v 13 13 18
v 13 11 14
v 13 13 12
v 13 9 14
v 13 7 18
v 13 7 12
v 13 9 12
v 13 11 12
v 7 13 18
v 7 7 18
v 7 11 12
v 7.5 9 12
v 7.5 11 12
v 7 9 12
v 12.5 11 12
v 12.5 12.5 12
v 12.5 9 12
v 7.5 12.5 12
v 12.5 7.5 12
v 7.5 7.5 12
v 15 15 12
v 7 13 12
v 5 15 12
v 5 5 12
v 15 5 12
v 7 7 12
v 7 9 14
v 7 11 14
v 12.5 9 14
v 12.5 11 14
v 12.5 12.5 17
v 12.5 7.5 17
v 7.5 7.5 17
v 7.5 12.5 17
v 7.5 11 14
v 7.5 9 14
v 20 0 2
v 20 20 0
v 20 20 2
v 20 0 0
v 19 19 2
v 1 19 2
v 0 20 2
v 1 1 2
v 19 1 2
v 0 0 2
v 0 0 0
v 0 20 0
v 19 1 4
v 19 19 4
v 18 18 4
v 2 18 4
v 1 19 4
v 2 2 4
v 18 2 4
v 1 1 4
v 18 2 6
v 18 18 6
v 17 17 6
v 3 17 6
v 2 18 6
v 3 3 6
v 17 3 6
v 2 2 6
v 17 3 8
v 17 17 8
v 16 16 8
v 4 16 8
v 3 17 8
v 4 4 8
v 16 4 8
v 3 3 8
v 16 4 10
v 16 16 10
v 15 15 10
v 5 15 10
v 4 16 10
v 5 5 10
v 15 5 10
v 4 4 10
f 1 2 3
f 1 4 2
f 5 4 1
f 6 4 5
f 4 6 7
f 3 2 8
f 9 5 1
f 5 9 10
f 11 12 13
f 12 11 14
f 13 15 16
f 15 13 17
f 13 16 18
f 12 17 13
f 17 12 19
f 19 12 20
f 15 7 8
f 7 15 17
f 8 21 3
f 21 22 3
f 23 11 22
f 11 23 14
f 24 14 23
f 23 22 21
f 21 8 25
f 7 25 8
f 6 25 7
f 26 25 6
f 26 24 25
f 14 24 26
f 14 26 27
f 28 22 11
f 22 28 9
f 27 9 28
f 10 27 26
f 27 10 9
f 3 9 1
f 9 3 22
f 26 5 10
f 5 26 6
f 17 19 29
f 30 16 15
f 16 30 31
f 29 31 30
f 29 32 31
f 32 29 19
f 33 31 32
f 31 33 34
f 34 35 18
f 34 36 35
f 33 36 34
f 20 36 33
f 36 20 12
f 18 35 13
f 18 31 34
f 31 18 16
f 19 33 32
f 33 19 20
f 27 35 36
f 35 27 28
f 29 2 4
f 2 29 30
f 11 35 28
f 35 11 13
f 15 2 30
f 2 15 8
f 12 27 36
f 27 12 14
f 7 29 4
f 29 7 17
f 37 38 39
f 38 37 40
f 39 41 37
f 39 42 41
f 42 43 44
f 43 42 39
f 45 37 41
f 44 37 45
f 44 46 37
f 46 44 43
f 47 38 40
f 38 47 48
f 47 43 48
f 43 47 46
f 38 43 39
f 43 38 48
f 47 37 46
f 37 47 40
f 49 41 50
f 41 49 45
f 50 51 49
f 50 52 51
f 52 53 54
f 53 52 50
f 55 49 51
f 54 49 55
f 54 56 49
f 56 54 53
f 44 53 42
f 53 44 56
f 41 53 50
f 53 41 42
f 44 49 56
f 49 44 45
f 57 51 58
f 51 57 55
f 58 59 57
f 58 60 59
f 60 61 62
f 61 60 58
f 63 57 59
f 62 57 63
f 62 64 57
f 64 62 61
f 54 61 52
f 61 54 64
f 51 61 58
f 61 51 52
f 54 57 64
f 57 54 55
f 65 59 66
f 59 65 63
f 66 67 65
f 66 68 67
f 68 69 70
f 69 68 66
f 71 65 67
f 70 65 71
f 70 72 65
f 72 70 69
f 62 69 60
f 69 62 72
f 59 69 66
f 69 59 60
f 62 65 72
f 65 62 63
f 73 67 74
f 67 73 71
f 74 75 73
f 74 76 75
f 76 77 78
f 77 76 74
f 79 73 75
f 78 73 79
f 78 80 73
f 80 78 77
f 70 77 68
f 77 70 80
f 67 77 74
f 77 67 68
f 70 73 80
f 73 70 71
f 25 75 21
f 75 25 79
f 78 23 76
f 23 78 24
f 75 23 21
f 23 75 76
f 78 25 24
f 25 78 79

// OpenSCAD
cube ([20, 20, 2]);
translate ([1, 1, 2])cube ([18, 18, 2]);
translate ([2, 2, 4])cube ([16, 16, 2]); 
translate ([3, 3, 6])cube ([14, 14, 2]); 
translate ([4, 4, 8])cube ([12, 12, 2]); 
translate ([5, 5, 10])cube ([10, 10, 2]); 
difference () {
translate ([7, 7, 12])cube (6); 
translate ([7.5, 7.5, 12])cube (5);
translate ([5, 9, 12])cube ([30, 2, 2]);}
